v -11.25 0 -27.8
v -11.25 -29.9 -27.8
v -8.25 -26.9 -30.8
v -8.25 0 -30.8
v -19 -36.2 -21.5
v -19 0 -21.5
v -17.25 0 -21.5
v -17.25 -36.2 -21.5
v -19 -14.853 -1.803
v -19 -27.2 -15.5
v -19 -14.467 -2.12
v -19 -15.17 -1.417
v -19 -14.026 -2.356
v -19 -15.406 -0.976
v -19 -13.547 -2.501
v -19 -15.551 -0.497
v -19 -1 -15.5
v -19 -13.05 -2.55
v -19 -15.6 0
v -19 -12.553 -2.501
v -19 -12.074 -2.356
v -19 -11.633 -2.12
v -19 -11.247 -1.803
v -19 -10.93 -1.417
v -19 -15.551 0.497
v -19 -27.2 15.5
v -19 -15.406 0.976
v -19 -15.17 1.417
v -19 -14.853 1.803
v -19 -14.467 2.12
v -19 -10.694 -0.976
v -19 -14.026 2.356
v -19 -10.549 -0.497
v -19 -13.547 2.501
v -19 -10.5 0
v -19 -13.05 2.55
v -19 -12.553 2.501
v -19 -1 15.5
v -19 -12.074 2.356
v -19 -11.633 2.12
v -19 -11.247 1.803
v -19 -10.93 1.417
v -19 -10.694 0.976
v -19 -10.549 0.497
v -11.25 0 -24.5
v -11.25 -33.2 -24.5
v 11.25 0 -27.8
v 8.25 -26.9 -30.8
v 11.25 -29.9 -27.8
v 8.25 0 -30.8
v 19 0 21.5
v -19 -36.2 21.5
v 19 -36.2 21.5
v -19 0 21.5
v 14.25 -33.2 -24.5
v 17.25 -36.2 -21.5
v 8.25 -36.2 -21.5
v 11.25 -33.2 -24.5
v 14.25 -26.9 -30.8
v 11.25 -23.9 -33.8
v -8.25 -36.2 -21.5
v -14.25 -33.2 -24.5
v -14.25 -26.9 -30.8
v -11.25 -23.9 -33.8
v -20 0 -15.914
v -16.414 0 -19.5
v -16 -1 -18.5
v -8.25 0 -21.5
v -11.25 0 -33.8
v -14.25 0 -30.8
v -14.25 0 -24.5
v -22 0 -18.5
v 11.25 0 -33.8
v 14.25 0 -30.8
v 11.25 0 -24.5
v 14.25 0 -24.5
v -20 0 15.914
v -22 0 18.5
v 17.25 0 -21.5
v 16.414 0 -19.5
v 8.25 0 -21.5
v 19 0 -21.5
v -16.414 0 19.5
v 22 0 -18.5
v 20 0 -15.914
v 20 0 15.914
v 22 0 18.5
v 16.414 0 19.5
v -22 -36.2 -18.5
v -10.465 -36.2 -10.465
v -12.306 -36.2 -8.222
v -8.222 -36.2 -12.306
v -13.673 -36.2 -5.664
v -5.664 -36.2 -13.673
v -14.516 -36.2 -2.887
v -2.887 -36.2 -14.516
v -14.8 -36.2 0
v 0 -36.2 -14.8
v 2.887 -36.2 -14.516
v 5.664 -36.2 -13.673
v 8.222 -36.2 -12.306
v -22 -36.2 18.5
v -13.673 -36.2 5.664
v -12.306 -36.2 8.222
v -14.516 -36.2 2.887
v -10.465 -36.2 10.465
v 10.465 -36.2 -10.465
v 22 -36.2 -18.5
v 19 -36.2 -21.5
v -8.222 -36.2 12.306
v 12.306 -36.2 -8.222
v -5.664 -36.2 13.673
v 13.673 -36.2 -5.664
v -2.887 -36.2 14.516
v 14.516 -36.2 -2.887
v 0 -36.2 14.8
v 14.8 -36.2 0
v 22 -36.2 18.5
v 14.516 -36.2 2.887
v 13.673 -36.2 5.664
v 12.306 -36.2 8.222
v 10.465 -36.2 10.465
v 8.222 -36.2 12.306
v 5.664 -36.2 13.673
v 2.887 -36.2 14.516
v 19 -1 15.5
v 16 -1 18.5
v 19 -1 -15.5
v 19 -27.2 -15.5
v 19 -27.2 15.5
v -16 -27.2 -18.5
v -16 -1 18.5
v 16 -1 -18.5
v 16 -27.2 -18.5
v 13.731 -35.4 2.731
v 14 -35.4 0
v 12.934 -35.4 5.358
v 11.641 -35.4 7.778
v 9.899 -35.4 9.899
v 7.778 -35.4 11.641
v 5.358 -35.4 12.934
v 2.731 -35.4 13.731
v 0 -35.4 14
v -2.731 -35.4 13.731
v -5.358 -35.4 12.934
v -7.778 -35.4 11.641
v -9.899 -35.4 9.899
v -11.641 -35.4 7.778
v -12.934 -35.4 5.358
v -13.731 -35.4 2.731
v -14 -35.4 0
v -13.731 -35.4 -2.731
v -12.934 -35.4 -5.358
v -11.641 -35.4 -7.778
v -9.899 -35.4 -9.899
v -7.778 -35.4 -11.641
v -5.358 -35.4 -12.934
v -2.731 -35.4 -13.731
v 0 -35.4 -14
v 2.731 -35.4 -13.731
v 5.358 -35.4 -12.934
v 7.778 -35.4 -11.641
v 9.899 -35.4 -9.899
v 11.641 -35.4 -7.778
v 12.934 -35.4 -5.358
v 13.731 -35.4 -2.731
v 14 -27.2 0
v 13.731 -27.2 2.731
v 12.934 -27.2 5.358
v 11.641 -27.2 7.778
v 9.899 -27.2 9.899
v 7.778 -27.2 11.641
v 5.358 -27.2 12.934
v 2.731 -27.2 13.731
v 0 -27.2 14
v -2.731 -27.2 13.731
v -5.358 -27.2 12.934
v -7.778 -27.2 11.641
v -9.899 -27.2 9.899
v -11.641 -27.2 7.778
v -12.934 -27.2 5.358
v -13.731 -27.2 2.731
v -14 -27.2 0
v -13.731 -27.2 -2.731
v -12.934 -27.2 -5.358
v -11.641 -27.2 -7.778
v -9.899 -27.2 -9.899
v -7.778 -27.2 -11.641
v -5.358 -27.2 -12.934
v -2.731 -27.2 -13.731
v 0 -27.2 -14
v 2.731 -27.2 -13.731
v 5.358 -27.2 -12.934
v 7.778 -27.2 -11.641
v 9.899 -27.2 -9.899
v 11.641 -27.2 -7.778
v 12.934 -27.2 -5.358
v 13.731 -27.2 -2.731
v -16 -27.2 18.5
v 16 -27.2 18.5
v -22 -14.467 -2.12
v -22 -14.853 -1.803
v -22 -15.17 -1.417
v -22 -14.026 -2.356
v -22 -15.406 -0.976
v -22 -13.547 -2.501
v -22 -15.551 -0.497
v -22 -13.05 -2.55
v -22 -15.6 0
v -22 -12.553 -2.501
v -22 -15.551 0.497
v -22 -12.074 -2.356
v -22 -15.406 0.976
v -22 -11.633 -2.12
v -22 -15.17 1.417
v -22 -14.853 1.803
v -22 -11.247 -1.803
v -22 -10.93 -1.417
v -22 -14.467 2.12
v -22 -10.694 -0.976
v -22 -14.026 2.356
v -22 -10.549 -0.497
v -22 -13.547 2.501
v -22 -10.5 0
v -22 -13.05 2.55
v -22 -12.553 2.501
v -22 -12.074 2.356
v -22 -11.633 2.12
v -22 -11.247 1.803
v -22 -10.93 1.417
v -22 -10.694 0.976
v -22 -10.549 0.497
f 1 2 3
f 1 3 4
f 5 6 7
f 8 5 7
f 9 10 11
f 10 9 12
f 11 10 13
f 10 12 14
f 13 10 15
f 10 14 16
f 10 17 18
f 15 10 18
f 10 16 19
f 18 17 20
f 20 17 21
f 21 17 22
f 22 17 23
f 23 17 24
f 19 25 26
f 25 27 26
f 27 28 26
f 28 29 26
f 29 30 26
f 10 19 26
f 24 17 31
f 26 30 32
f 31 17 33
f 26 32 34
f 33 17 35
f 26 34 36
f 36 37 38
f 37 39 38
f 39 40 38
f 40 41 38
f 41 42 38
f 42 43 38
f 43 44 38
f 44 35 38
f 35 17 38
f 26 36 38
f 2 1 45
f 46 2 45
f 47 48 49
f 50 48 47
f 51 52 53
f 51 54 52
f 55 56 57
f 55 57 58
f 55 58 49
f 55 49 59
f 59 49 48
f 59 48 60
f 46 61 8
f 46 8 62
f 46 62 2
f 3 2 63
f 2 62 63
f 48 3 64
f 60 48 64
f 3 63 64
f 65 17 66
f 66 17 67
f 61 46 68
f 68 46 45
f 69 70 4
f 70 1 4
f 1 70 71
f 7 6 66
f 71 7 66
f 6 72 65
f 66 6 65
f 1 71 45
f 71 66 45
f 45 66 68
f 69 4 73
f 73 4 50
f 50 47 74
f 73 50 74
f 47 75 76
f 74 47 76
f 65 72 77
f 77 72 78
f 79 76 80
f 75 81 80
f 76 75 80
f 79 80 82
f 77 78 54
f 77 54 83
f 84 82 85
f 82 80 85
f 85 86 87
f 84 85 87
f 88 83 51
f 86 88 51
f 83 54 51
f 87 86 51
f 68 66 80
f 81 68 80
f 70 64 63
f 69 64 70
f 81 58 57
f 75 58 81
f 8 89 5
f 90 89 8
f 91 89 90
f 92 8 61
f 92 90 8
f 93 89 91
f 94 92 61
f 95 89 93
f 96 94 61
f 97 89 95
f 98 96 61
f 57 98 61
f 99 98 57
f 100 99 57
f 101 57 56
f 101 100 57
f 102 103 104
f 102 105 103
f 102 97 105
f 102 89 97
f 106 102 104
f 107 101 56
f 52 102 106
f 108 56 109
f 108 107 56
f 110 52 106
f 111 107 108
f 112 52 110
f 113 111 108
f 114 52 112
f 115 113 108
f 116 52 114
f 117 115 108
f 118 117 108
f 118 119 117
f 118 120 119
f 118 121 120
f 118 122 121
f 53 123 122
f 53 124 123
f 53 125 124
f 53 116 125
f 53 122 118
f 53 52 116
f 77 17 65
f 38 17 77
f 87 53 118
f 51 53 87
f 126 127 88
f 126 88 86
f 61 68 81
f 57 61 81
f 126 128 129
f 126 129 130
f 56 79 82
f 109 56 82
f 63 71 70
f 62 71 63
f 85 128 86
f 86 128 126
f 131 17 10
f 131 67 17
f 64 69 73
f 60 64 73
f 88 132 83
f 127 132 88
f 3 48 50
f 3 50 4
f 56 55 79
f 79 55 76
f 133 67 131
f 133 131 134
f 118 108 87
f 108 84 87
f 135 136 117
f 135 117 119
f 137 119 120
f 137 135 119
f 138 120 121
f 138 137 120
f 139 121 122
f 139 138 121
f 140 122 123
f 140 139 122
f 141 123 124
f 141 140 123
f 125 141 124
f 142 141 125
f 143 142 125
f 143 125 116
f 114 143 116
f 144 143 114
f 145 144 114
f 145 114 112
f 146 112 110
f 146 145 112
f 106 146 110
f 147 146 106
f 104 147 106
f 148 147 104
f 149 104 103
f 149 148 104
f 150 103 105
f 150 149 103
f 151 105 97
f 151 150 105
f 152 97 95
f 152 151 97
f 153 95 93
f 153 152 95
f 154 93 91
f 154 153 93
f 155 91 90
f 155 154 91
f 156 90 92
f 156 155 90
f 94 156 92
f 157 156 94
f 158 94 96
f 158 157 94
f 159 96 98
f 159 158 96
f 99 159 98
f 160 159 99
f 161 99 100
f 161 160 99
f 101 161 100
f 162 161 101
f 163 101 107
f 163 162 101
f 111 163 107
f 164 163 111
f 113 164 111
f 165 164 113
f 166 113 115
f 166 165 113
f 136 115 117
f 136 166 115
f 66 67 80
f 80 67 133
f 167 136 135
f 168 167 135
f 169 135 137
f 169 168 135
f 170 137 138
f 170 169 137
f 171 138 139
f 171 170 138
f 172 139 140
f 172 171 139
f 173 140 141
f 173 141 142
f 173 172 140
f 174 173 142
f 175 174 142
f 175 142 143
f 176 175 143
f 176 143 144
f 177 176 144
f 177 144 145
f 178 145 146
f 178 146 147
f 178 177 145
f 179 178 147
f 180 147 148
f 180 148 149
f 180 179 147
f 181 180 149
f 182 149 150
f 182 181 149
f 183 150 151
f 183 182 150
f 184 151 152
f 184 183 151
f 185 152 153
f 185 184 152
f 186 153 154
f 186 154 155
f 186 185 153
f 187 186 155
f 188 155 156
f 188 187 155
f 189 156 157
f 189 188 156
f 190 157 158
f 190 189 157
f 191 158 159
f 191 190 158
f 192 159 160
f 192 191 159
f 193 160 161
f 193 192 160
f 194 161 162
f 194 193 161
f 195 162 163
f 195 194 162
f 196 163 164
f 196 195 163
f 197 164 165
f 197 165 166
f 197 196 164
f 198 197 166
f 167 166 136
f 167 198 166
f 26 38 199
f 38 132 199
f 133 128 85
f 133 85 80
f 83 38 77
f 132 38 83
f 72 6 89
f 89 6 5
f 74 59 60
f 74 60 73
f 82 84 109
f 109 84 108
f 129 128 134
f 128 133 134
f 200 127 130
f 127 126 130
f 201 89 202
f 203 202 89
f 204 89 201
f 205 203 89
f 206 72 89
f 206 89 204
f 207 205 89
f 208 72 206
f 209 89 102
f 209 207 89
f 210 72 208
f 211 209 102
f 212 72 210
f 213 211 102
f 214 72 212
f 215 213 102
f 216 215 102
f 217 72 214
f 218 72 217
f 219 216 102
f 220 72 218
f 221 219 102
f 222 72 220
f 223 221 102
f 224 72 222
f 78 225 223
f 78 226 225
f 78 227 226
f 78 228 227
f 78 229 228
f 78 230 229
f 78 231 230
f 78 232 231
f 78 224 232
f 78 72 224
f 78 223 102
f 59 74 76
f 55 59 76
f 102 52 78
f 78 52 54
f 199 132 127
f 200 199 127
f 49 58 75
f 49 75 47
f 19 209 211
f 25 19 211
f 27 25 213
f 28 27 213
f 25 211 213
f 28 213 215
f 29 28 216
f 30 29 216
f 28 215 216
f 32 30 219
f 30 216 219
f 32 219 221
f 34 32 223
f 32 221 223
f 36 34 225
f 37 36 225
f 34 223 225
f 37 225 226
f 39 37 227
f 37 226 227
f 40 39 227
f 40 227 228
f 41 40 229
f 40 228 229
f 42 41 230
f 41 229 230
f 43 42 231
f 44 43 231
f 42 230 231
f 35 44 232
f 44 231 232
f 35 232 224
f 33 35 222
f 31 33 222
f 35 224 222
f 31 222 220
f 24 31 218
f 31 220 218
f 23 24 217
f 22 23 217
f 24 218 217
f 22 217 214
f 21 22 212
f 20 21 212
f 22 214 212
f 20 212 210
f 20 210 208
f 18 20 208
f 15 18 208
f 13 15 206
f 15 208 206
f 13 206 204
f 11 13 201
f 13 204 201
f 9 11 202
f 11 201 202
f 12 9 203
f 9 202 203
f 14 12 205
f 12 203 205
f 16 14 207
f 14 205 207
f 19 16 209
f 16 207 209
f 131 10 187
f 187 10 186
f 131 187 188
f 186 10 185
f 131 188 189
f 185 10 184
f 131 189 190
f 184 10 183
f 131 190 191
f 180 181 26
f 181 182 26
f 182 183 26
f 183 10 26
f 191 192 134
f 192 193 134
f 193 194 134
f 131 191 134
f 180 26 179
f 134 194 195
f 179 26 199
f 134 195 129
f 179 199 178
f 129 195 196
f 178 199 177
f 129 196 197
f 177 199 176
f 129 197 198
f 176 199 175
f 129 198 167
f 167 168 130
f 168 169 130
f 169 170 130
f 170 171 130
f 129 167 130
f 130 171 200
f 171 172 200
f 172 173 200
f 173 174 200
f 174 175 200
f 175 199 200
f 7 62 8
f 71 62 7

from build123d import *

# Parameters (mm, degrees)
F0_W        = 44
F0_H        = 43
F0_W_2      = 38
F0_H_2      = 37
F1_DEPTH    = 27.2
F2_W        = 44
F2_H        = 43
F2_R        = 14
F3_DEPTH    = 9
F4_SIZE     = 3
F6_DEPTH    = 36.2
F7_SIZE     = 3
F8_T1_DEPTH = 85.763401504
F9_R        = 2.55
F10_DEPTH   = 3
F11_SIZE    = 0.8
F12_SIZE    = 1


# Not quite as in the source:
# - a fillet or chamfer that OpenCascade refuses, or shapes differently, is made with other operations: its cross-section is extruded or revolved along the edge and cut away or added


with BuildPart() as f1:
    # F0 (on Front) → F1 (new body)
    with BuildSketch(Plane.XZ):
        Rectangle(F0_W, F0_H)
        Rectangle(F0_W_2, F0_H_2, mode=Mode.SUBTRACT)
    extrude(amount=F1_DEPTH)

    # F2 (on face) → F3 (join)
    with BuildSketch(Plane.XZ.offset(27.2)):
        Rectangle(F2_W, F2_H)
        Circle(F2_R, mode=Mode.SUBTRACT)
    extrude(amount=F3_DEPTH)

    # F4
    f4_edges = [f1.edges().sort_by_distance(p)[0] for p in [
        (22, -18.1, 21.5),
        (22, -18.1, -21.5),
        (-22, -18.1, -21.5),
        (-22, -18.1, 21.5),
        (-19, -13.6, 18.5),
        (-19, -13.6, -18.5),
        (19, -13.6, -18.5),
        (19, -13.6, 18.5),
    ]]
    chamfer(f4_edges, length=F4_SIZE)

    # F5 (on face) → F6 (join, through all)
    with BuildSketch(Plane.XZ.offset(36.2)):
        Polygon((-14.25, -33.8), (14.25, -33.8), (14.25, -21.5), (11.25, -21.5), (11.25, -30.8), (-11.25, -30.8), (-11.25, -21.5), (-14.25, -21.5), align=None)
    extrude(amount=-F6_DEPTH)

    # F7
    f7_edges = [f1.edges().sort_by_distance(p)[0] for p in [
        (-14.25, -18.1, -33.8),
        (-14.25, -18.1, -21.5),
        (-11.25, -18.1, -30.8),
        (11.25, -18.1, -30.8),
        (11.25, -18.1, -21.5),
        (14.25, -18.1, -33.8),
        (14.25, -18.1, -21.5),
        (-11.25, -18.1, -21.5),
    ]]
    chamfer(f7_edges, length=F7_SIZE)

    # F8: chamfer of 12.3 on 1 edges, made by hand

    # F8_s2 → F8_t1 (cut)
    with BuildSketch(Plane.YZ.offset(-42.881700752)):
        Polygon((-36.2, -21.5), (-23.9, -33.8), (-36.2, -33.8), align=None)
    extrude(amount=F8_T1_DEPTH, mode=Mode.SUBTRACT)

    # F9 (on face) → F10 (cut, through all)
    with BuildSketch(Plane(origin=(-22, 0, 0), x_dir=(0, -1, 0), z_dir=(-1, 0, 0))):
        with Locations((13.05, 0)):
            Circle(F9_R)
    extrude(amount=-F10_DEPTH, mode=Mode.SUBTRACT)

    # F11
    f11_edges = [f1.edges().sort_by_distance(p)[0] for p in [
        (-14, -36.2, 0),
    ]]
    chamfer(f11_edges, length=F11_SIZE)

    # F12
    f12_edges = [f1.edges().sort_by_distance(p)[0] for p in [
        (0, 0, 18.5),
        (19, 0, 0),
        (0, 0, -18.5),
        (-19, 0, 0),
        (17.5, 0, 17),
        (17.5, 0, -17),
        (-17.5, 0, -17),
        (-17.5, 0, 17),
    ]]
    chamfer(f12_edges, length=F12_SIZE)


solid = f1.part
